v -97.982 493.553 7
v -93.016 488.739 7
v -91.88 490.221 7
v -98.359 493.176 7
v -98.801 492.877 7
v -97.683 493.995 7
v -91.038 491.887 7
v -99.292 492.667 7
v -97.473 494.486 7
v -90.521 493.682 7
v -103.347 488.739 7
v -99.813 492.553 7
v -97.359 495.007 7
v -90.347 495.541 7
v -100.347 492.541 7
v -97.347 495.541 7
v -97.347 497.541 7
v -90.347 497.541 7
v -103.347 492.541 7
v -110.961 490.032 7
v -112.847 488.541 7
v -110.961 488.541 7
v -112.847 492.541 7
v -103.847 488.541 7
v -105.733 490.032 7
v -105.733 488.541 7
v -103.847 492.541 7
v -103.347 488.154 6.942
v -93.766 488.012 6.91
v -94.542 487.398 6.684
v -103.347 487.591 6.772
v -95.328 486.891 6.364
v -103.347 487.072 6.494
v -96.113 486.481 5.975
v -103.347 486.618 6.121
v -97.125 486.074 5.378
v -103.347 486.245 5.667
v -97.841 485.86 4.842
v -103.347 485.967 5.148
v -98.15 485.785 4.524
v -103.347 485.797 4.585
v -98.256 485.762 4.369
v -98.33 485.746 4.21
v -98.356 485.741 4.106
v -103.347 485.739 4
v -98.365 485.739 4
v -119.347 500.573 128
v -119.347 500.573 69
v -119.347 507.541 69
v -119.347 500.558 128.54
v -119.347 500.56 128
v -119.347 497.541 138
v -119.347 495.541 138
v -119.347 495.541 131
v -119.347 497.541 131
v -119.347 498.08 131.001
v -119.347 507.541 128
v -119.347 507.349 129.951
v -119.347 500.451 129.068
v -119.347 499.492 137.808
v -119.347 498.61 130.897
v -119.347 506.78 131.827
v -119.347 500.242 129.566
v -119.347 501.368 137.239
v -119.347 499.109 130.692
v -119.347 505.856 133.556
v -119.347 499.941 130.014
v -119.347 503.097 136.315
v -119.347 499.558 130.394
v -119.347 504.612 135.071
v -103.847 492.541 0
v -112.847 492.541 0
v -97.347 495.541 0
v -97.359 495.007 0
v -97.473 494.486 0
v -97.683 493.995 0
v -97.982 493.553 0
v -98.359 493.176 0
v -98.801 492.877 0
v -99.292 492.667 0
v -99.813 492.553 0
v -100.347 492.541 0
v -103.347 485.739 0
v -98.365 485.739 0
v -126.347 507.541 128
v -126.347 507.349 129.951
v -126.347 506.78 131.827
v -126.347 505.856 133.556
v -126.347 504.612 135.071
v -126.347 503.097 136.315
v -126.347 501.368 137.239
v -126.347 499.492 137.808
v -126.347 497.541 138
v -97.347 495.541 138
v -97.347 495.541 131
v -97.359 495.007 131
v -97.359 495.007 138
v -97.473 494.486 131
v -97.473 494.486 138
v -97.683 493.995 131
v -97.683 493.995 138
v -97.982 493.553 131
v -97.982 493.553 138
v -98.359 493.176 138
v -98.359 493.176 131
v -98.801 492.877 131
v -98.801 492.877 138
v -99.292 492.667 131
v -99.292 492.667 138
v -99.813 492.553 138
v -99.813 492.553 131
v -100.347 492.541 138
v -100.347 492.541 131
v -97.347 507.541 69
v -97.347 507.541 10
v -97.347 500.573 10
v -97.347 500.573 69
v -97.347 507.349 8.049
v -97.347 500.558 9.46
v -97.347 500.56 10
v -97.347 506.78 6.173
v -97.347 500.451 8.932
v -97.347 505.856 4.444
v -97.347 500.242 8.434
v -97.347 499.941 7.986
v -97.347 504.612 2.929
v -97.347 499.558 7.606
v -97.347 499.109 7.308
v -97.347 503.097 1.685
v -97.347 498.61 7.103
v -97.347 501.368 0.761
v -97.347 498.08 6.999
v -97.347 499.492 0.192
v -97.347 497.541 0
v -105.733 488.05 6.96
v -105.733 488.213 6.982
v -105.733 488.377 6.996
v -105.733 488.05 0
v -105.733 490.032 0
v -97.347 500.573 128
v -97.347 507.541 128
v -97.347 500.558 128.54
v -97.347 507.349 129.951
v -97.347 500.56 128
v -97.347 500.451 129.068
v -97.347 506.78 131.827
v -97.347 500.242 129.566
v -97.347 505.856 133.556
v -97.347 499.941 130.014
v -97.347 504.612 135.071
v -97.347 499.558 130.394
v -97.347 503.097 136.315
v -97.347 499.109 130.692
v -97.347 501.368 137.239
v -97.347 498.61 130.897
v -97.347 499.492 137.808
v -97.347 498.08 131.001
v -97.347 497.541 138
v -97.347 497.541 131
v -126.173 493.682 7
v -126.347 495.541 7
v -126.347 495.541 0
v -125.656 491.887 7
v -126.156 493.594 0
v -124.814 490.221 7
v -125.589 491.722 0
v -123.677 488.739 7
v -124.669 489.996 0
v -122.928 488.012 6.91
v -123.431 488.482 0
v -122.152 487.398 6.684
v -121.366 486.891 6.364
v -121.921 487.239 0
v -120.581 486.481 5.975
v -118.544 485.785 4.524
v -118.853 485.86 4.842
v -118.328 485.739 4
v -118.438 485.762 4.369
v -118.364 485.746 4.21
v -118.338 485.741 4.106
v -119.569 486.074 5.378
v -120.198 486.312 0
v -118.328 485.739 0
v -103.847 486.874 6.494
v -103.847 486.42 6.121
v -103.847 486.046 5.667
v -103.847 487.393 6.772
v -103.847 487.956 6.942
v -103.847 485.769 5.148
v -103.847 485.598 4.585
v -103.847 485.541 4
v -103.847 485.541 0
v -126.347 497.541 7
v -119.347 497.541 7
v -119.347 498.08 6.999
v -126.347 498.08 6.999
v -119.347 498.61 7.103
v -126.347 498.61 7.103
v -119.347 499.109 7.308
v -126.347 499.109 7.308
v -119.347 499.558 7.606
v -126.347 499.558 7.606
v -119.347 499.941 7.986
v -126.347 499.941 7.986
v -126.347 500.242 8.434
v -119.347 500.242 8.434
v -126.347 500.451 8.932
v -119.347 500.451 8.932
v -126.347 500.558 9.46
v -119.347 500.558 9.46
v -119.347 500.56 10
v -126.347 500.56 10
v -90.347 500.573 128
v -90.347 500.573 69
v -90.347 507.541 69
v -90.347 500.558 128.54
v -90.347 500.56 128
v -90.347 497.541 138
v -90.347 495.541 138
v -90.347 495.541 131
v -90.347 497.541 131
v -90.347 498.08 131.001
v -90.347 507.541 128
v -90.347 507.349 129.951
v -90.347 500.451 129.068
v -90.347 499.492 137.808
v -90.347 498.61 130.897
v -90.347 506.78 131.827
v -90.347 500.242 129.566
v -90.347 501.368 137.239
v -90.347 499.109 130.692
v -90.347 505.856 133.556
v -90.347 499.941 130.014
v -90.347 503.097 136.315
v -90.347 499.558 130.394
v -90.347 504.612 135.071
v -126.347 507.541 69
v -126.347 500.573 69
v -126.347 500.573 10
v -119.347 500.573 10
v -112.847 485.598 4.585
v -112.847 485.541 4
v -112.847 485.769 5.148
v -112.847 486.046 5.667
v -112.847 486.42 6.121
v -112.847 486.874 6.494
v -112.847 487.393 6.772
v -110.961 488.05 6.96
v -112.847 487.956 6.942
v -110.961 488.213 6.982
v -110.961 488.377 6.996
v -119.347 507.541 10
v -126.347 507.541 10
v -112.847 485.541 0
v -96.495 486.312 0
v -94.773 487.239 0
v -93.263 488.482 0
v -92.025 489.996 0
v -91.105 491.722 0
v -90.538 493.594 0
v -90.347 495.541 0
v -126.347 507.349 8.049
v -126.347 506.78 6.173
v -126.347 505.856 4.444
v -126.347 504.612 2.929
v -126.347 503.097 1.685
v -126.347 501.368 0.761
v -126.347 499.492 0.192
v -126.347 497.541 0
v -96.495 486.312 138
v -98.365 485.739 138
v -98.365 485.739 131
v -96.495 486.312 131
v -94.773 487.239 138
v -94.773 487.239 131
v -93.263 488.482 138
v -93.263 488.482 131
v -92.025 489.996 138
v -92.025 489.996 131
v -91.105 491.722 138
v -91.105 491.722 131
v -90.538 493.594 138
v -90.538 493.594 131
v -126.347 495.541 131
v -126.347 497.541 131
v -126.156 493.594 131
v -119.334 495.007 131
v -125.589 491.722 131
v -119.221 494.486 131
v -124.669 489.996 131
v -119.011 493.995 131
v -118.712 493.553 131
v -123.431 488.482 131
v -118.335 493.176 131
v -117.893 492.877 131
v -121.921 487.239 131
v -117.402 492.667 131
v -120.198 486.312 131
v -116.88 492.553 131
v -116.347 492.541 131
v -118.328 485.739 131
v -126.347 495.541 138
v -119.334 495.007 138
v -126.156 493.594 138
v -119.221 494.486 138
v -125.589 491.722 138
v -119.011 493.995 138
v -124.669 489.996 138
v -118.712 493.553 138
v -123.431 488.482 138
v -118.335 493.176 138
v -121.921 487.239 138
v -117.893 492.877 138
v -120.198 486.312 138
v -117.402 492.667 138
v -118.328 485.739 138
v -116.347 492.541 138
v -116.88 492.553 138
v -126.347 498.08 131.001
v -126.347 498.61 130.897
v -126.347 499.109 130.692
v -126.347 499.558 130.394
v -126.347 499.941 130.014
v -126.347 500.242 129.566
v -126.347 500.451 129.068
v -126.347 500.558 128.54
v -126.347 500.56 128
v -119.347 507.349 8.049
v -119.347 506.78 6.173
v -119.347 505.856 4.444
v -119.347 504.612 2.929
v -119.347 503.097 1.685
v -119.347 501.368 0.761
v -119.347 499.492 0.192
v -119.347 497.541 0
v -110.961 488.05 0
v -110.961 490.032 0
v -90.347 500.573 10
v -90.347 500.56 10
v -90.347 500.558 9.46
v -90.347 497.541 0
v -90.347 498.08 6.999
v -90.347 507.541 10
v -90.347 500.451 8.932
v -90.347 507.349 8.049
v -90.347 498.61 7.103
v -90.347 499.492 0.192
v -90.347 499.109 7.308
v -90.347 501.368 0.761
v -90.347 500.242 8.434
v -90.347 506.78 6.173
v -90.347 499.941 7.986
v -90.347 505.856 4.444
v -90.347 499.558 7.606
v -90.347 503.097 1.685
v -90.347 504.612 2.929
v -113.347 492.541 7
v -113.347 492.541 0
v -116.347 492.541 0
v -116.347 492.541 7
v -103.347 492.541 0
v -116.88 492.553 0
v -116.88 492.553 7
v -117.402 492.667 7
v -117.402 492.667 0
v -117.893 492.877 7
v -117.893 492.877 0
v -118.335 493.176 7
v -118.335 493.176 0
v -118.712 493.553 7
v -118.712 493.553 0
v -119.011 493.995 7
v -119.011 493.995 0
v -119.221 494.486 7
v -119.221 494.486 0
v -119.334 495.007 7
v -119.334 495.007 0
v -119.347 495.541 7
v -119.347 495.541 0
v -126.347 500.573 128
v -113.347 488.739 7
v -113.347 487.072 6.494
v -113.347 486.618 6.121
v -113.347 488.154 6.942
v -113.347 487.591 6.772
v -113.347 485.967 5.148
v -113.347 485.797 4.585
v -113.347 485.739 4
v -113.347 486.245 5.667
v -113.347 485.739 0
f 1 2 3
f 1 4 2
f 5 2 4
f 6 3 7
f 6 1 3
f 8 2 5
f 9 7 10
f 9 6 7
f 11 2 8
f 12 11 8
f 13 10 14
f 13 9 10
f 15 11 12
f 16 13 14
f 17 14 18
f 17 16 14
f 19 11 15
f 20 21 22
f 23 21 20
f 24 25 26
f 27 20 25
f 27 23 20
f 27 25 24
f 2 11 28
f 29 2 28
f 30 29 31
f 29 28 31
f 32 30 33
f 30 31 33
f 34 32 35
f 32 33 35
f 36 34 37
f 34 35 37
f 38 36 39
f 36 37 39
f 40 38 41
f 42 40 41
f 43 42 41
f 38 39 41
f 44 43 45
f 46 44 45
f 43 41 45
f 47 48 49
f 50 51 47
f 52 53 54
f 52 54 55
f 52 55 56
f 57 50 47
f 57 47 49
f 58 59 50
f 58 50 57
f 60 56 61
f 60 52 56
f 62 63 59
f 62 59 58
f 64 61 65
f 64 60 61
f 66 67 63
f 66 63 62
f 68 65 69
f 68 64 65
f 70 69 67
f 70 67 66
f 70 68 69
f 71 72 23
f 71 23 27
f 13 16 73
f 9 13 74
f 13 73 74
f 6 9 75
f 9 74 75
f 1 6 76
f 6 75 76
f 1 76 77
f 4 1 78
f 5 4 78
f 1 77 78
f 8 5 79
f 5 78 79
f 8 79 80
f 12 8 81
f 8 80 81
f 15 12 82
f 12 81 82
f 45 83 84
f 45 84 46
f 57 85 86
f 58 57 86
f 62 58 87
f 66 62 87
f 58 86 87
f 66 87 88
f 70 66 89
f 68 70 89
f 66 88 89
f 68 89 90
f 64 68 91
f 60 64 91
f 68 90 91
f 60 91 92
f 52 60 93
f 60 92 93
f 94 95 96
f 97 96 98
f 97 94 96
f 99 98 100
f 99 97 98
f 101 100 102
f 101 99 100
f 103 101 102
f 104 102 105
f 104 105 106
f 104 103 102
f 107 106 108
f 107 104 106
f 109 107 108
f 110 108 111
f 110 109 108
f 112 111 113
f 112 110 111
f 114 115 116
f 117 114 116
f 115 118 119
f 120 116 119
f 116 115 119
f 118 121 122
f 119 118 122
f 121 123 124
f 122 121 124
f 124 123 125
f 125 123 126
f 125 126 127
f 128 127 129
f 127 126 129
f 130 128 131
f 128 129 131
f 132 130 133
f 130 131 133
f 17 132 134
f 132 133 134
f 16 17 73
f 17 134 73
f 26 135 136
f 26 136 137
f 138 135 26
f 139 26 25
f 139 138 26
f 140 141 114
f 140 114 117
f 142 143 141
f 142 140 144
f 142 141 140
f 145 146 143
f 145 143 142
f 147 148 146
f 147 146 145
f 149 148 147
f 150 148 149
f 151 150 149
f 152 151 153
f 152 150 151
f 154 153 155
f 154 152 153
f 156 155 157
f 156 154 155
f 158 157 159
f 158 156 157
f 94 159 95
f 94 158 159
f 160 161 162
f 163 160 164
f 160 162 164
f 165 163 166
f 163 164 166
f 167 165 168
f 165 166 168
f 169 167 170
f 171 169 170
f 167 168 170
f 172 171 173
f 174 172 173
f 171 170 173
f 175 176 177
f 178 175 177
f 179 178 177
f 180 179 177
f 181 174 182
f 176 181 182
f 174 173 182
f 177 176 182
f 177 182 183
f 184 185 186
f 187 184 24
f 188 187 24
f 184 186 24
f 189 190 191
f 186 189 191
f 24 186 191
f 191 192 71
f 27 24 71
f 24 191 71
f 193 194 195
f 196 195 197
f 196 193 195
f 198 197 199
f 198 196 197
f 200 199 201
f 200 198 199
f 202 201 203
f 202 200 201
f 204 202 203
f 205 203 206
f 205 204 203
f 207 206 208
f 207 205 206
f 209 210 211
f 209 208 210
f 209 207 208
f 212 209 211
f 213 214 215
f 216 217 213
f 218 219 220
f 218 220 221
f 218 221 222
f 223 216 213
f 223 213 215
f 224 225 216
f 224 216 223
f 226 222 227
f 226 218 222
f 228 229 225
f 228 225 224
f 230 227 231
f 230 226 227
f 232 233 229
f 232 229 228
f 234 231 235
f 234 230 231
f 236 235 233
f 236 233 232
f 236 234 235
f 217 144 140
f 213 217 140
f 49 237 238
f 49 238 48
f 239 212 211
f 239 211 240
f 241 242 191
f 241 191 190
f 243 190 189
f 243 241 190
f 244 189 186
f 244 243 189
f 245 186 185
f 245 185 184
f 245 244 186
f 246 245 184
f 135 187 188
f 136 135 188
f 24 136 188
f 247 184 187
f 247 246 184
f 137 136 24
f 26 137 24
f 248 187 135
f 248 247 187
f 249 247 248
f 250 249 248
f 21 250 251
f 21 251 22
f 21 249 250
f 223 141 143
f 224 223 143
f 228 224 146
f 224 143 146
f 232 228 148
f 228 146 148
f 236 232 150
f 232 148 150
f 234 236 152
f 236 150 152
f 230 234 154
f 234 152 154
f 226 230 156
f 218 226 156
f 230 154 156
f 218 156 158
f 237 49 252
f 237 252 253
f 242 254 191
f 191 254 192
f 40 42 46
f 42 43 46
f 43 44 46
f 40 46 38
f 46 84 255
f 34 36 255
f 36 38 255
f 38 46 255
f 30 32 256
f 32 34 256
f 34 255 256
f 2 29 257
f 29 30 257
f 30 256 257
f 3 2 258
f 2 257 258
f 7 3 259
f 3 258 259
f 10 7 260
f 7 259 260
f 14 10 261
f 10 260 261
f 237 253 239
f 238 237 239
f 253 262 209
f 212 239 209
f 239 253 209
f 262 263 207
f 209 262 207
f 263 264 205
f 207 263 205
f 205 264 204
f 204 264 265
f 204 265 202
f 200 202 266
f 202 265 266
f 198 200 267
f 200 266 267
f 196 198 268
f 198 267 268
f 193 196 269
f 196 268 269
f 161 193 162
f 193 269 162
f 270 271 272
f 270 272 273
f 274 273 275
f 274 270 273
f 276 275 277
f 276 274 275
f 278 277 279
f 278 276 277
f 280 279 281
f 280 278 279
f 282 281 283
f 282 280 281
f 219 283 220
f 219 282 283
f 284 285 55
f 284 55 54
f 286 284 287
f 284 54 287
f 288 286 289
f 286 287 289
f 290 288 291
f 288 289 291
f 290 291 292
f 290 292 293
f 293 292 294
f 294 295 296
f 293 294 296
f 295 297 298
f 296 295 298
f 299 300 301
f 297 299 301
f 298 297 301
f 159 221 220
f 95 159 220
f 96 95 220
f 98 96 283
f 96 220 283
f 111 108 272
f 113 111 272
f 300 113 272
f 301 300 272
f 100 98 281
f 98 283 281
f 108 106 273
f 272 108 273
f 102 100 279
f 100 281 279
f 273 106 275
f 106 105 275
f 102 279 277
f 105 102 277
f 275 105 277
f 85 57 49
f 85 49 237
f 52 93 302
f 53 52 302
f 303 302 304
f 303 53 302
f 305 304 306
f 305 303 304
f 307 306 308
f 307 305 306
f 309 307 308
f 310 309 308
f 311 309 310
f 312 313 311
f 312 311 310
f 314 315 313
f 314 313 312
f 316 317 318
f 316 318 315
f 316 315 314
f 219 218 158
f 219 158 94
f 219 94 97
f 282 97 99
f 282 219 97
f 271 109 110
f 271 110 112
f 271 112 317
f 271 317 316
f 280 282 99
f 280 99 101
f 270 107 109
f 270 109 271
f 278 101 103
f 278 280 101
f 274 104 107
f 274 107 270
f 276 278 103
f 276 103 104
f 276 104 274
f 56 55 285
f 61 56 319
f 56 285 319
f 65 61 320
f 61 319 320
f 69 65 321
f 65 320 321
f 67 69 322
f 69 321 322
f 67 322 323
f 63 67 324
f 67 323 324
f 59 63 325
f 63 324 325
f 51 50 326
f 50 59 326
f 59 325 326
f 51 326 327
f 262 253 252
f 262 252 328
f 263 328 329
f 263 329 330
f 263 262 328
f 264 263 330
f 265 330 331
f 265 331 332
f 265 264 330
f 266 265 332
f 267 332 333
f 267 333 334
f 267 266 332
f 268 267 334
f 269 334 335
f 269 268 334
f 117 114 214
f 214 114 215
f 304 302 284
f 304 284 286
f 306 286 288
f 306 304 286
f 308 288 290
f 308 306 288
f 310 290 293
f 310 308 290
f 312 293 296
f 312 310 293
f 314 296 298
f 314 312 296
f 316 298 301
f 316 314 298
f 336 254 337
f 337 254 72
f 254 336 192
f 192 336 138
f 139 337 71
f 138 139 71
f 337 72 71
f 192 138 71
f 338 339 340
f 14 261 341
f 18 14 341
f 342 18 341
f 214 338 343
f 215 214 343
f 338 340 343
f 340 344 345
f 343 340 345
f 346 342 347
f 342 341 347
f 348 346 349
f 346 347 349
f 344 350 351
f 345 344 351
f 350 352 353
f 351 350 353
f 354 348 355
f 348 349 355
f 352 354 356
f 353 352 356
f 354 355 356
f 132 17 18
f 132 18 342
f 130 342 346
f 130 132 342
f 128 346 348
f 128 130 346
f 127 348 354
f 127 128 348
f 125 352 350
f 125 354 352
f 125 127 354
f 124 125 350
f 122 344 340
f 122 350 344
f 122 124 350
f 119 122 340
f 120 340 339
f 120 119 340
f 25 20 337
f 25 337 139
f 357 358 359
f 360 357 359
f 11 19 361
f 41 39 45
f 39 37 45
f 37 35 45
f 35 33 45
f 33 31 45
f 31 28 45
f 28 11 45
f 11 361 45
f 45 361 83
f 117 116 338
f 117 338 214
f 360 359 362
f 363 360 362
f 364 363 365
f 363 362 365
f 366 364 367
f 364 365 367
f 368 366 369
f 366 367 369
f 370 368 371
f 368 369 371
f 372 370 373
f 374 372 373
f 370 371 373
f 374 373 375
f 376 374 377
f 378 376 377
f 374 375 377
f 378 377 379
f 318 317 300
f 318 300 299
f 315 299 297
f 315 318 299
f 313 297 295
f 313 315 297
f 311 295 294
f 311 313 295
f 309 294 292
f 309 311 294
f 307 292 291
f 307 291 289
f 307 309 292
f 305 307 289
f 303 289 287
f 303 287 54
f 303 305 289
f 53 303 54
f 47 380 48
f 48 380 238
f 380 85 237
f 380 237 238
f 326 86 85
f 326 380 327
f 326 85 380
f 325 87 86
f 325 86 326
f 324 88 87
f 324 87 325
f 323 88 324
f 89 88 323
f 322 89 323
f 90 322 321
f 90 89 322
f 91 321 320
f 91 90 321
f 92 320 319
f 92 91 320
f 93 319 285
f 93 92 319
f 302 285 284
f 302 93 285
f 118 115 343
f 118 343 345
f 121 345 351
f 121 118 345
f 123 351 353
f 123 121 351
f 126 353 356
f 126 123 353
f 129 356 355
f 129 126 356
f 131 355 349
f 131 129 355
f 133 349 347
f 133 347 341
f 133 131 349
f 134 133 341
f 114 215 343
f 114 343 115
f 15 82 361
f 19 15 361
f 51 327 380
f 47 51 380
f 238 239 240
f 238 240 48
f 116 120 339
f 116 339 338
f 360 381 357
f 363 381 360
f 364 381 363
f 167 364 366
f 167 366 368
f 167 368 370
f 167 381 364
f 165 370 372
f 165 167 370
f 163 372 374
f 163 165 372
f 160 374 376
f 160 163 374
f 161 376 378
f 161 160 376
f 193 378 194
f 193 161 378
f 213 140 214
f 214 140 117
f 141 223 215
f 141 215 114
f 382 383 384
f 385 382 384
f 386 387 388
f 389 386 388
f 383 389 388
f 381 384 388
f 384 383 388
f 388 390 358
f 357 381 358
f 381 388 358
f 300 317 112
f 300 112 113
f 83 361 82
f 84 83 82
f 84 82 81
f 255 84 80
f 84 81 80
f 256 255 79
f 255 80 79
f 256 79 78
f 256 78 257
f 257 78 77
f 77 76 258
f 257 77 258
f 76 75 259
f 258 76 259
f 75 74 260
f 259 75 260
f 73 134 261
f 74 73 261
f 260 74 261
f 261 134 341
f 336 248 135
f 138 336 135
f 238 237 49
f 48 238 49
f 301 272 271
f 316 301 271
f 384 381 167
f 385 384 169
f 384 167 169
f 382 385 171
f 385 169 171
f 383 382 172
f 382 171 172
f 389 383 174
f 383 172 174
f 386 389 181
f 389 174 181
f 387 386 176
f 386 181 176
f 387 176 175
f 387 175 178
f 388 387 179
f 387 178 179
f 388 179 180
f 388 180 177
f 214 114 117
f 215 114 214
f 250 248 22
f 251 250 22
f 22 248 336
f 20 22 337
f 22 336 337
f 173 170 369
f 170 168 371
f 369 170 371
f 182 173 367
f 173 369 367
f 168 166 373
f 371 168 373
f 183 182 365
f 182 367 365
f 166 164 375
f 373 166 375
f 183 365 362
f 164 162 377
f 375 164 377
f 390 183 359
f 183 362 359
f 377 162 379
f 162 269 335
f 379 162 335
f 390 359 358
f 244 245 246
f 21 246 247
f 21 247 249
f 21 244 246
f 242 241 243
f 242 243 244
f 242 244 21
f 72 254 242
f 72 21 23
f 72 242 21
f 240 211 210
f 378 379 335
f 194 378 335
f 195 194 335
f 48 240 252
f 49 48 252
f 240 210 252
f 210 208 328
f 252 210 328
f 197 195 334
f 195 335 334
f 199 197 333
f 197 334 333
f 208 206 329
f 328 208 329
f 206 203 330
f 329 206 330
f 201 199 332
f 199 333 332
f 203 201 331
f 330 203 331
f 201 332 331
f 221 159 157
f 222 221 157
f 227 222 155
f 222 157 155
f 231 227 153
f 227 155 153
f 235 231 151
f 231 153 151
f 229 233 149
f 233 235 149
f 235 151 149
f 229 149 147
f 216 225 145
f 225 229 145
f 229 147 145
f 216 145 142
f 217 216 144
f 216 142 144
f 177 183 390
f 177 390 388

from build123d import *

# Parameters (mm, degrees)
F3_DEPTH      = 69
F4_W          = 9.8017244339
F4_H          = 7
F5_DEPTH      = 81.7
F7_W          = 9
F7_H          = 7
F7_W_2        = 5.2275949775
F7_H_2        = 1.981525898
F8_DEPTH      = 7
F9_T1_DEPTH   = 19.9814636312
F9_2_T1_DEPTH = 19.9814636312
F9_3_T1_DEPTH = 24
F10_DEPTH     = 11.5


# Not quite as in the source:
# - a fillet or chamfer that OpenCascade refuses, or shapes differently, is made with other operations: its cross-section is extruded or revolved along the edge and cut away or added


with BuildPart() as f3:
    # F2 (on Top) → F3 (new body)
    with BuildSketch(Plane.XY):
        with BuildLine():
            Line((-126.34694054, 507.5408363342), (-126.34694054, 500.5408363342))
            Line((-126.34694054, 500.5408363342), (-126.34694054, 495.5408363342))
            ThreePointArc((-126.34694054, 495.5408363342), (-123.4180083519, 488.4697685224), (-116.34694054, 485.5408363342))
            Line((-116.34694054, 485.5408363342), (-113.34694054, 485.5408363342))
            Line((-113.34694054, 485.5408363342), (-113.34694054, 492.5408363342))
            Line((-113.34694054, 492.5408363342), (-116.34694054, 492.5408363342))
            ThreePointArc((-116.34694054, 492.5408363342), (-118.5323459538, 493.3554309204), (-119.34694054, 495.5408363342))
            Line((-119.34694054, 495.5408363342), (-119.34694054, 500.5408363342))
            Line((-119.34694054, 500.5408363342), (-119.34694054, 507.5408363342))
            Line((-119.34694054, 507.5408363342), (-126.34694054, 507.5408363342))
        make_face()
    extrude(amount=F3_DEPTH)


with BuildPart() as f3b:
    # F2 (on Top) → F3, piece 2 (new body)
    with BuildSketch(Plane.XY):
        with BuildLine():
            Line((-103.34694054, 492.5408363342), (-103.34694054, 485.5408363342))
            Line((-103.34694054, 485.5408363342), (-100.34694054, 485.5408363342))
            ThreePointArc((-100.34694054, 485.5408363342), (-93.2758727282, 488.4697685224), (-90.34694054, 495.5408363342))
            Line((-90.34694054, 495.5408363342), (-90.34694054, 500.5408363342))
            Line((-90.34694054, 500.5408363342), (-90.34694054, 507.5408363342))
            Line((-90.34694054, 507.5408363342), (-97.34694054, 507.5408363342))
            Line((-97.34694054, 507.5408363342), (-97.34694054, 500.5408363342))
            Line((-97.34694054, 500.5408363342), (-97.34694054, 495.5408363342))
            ThreePointArc((-97.34694054, 495.5408363342), (-98.1615351262, 493.3554309204), (-100.34694054, 492.5408363342))
            Line((-100.34694054, 492.5408363342), (-103.34694054, 492.5408363342))
        make_face()
    extrude(amount=F3_DEPTH)


with BuildPart() as f5_tool:
    # F4 (on face) → F5 (new body)
    with BuildSketch(Plane(origin=(-126.34694054, 0, 0), x_dir=(0, -1, 0), z_dir=(-1, 0, 0))):
        Polygon((-500.5727462455, 69), (-507.5408363342, 69), (-507.5408363342, 16.4578538388), (-507.5408363342, 10), (-500.5727462455, 10), align=None)
        with Locations((-490.6399741173, 3.5)):
            Rectangle(F4_W, F4_H)
        with BuildLine():
            Line((-500.5599826709, 10), (-500.5727462455, 10))
            Line((-500.5727462455, 10), (-507.5408363342, 10))
            ThreePointArc((-507.5408363342, 10), (-504.6119041461, 2.9289321881), (-497.5408363342, 0))
            Line((-497.5408363342, 0), (-495.5408363342, 0))
            Line((-495.5408363342, 0), (-495.5408363342, 7))
            Line((-495.5408363342, 7), (-497.5408363342, 7))
            ThreePointArc((-497.5408363342, 7), (-499.7591459044, 7.7867403629), (-500.5599826709, 10))
        make_face()
    extrude(amount=-F5_DEPTH)


with BuildPart() as f3_1:
    add(f3.part)

    # F5: intersect by f5_tool
    add(f5_tool.part, mode=Mode.INTERSECT)


with BuildPart() as f3b_1:
    add(f3b.part)

    # F5: intersect by f5_tool
    add(f5_tool.part, mode=Mode.INTERSECT)


with BuildPart() as f6_1:
    # F6: instance of F3
    add(f3_1.part.mirror(Plane(origin=(-93.84694054, 504.0567912899, 69), x_dir=(1, 0, 0), z_dir=(0, 0, 1))))



with BuildPart() as f6_2:
    # F6: instance of F3b
    add(f3b_1.part.mirror(Plane(origin=(-93.84694054, 504.0567912899, 69), x_dir=(1, 0, 0), z_dir=(0, 0, 1))))


with BuildPart() as f8:
    # F7 (on Top) → F8 (new body)
    with BuildSketch(Plane.XY):
        with Locations((-108.34694054, 489.0408363342)):
            Rectangle(F7_W, F7_H)
        with Locations((-108.34694054, 489.0408363342)):
            Rectangle(F7_W_2, F7_H_2, mode=Mode.SUBTRACT)
    extrude(amount=F8_DEPTH)

    # F9#3: fillet of radius 3 on 1 edges, made by hand

    # F9_3_s2 → F9_3_t1 (cut)
    with BuildSketch(Plane.YZ.offset(-120.34694054)):
        with BuildLine():
            ThreePointArc((485.5408363342, 4), (486.4195159907, 6.1213203436), (488.5408363342, 7))
            Line((488.5408363342, 7), (485.5408363342, 7))
            Line((485.5408363342, 7), (485.5408363342, 4))
        make_face()
    extrude(amount=F9_3_T1_DEPTH, mode=Mode.SUBTRACT)


with BuildPart() as f3_2:
    add(f3_1.part)

    # F9: fillet of radius 3 on 1 edges, made by hand

    # F9_s2 → F9_t1 (cut)
    with BuildSketch(Plane.YZ.offset(-125.8284041713)):
        with BuildLine():
            ThreePointArc((488.7391119003, 7), (486.6177915568, 6.1213203436), (485.7391119003, 4))
            Line((485.7391119003, 4), (485.7391119003, 7))
            Line((485.7391119003, 7), (488.7391119003, 7))
        make_face()
    extrude(amount=F9_T1_DEPTH, mode=Mode.SUBTRACT)


with BuildPart() as f3b_2:
    add(f3b_1.part)

    # F9#2: fillet of radius 3 on 1 edges, made by hand

    # F9_2_s2 → F9_2_t1 (cut)
    with BuildSketch(Plane.YZ.offset(-110.84694054)):
        with BuildLine():
            ThreePointArc((488.7391119003, 7), (486.6177915568, 6.1213203436), (485.7391119003, 4))
            Line((485.7391119003, 4), (485.7391119003, 7))
            Line((485.7391119003, 7), (488.7391119003, 7))
        make_face()
    extrude(amount=F9_2_T1_DEPTH, mode=Mode.SUBTRACT)


with BuildPart() as f6_1_1:
    add(f6_1.part)
    # F10 (add): a face of the model
    f10_faces = [f6_2.part.faces().sort_by_distance(p)[0] for p in [
        (-103.34694054, 489.1399741173, 134.5),
    ]]

    add(f6_2.part)  # F10 merges F6_2
    extrude(f10_faces, amount=F10_DEPTH)


solid = Compound([f8.part, f3_2.part, f3b_2.part, f6_1_1.part])
